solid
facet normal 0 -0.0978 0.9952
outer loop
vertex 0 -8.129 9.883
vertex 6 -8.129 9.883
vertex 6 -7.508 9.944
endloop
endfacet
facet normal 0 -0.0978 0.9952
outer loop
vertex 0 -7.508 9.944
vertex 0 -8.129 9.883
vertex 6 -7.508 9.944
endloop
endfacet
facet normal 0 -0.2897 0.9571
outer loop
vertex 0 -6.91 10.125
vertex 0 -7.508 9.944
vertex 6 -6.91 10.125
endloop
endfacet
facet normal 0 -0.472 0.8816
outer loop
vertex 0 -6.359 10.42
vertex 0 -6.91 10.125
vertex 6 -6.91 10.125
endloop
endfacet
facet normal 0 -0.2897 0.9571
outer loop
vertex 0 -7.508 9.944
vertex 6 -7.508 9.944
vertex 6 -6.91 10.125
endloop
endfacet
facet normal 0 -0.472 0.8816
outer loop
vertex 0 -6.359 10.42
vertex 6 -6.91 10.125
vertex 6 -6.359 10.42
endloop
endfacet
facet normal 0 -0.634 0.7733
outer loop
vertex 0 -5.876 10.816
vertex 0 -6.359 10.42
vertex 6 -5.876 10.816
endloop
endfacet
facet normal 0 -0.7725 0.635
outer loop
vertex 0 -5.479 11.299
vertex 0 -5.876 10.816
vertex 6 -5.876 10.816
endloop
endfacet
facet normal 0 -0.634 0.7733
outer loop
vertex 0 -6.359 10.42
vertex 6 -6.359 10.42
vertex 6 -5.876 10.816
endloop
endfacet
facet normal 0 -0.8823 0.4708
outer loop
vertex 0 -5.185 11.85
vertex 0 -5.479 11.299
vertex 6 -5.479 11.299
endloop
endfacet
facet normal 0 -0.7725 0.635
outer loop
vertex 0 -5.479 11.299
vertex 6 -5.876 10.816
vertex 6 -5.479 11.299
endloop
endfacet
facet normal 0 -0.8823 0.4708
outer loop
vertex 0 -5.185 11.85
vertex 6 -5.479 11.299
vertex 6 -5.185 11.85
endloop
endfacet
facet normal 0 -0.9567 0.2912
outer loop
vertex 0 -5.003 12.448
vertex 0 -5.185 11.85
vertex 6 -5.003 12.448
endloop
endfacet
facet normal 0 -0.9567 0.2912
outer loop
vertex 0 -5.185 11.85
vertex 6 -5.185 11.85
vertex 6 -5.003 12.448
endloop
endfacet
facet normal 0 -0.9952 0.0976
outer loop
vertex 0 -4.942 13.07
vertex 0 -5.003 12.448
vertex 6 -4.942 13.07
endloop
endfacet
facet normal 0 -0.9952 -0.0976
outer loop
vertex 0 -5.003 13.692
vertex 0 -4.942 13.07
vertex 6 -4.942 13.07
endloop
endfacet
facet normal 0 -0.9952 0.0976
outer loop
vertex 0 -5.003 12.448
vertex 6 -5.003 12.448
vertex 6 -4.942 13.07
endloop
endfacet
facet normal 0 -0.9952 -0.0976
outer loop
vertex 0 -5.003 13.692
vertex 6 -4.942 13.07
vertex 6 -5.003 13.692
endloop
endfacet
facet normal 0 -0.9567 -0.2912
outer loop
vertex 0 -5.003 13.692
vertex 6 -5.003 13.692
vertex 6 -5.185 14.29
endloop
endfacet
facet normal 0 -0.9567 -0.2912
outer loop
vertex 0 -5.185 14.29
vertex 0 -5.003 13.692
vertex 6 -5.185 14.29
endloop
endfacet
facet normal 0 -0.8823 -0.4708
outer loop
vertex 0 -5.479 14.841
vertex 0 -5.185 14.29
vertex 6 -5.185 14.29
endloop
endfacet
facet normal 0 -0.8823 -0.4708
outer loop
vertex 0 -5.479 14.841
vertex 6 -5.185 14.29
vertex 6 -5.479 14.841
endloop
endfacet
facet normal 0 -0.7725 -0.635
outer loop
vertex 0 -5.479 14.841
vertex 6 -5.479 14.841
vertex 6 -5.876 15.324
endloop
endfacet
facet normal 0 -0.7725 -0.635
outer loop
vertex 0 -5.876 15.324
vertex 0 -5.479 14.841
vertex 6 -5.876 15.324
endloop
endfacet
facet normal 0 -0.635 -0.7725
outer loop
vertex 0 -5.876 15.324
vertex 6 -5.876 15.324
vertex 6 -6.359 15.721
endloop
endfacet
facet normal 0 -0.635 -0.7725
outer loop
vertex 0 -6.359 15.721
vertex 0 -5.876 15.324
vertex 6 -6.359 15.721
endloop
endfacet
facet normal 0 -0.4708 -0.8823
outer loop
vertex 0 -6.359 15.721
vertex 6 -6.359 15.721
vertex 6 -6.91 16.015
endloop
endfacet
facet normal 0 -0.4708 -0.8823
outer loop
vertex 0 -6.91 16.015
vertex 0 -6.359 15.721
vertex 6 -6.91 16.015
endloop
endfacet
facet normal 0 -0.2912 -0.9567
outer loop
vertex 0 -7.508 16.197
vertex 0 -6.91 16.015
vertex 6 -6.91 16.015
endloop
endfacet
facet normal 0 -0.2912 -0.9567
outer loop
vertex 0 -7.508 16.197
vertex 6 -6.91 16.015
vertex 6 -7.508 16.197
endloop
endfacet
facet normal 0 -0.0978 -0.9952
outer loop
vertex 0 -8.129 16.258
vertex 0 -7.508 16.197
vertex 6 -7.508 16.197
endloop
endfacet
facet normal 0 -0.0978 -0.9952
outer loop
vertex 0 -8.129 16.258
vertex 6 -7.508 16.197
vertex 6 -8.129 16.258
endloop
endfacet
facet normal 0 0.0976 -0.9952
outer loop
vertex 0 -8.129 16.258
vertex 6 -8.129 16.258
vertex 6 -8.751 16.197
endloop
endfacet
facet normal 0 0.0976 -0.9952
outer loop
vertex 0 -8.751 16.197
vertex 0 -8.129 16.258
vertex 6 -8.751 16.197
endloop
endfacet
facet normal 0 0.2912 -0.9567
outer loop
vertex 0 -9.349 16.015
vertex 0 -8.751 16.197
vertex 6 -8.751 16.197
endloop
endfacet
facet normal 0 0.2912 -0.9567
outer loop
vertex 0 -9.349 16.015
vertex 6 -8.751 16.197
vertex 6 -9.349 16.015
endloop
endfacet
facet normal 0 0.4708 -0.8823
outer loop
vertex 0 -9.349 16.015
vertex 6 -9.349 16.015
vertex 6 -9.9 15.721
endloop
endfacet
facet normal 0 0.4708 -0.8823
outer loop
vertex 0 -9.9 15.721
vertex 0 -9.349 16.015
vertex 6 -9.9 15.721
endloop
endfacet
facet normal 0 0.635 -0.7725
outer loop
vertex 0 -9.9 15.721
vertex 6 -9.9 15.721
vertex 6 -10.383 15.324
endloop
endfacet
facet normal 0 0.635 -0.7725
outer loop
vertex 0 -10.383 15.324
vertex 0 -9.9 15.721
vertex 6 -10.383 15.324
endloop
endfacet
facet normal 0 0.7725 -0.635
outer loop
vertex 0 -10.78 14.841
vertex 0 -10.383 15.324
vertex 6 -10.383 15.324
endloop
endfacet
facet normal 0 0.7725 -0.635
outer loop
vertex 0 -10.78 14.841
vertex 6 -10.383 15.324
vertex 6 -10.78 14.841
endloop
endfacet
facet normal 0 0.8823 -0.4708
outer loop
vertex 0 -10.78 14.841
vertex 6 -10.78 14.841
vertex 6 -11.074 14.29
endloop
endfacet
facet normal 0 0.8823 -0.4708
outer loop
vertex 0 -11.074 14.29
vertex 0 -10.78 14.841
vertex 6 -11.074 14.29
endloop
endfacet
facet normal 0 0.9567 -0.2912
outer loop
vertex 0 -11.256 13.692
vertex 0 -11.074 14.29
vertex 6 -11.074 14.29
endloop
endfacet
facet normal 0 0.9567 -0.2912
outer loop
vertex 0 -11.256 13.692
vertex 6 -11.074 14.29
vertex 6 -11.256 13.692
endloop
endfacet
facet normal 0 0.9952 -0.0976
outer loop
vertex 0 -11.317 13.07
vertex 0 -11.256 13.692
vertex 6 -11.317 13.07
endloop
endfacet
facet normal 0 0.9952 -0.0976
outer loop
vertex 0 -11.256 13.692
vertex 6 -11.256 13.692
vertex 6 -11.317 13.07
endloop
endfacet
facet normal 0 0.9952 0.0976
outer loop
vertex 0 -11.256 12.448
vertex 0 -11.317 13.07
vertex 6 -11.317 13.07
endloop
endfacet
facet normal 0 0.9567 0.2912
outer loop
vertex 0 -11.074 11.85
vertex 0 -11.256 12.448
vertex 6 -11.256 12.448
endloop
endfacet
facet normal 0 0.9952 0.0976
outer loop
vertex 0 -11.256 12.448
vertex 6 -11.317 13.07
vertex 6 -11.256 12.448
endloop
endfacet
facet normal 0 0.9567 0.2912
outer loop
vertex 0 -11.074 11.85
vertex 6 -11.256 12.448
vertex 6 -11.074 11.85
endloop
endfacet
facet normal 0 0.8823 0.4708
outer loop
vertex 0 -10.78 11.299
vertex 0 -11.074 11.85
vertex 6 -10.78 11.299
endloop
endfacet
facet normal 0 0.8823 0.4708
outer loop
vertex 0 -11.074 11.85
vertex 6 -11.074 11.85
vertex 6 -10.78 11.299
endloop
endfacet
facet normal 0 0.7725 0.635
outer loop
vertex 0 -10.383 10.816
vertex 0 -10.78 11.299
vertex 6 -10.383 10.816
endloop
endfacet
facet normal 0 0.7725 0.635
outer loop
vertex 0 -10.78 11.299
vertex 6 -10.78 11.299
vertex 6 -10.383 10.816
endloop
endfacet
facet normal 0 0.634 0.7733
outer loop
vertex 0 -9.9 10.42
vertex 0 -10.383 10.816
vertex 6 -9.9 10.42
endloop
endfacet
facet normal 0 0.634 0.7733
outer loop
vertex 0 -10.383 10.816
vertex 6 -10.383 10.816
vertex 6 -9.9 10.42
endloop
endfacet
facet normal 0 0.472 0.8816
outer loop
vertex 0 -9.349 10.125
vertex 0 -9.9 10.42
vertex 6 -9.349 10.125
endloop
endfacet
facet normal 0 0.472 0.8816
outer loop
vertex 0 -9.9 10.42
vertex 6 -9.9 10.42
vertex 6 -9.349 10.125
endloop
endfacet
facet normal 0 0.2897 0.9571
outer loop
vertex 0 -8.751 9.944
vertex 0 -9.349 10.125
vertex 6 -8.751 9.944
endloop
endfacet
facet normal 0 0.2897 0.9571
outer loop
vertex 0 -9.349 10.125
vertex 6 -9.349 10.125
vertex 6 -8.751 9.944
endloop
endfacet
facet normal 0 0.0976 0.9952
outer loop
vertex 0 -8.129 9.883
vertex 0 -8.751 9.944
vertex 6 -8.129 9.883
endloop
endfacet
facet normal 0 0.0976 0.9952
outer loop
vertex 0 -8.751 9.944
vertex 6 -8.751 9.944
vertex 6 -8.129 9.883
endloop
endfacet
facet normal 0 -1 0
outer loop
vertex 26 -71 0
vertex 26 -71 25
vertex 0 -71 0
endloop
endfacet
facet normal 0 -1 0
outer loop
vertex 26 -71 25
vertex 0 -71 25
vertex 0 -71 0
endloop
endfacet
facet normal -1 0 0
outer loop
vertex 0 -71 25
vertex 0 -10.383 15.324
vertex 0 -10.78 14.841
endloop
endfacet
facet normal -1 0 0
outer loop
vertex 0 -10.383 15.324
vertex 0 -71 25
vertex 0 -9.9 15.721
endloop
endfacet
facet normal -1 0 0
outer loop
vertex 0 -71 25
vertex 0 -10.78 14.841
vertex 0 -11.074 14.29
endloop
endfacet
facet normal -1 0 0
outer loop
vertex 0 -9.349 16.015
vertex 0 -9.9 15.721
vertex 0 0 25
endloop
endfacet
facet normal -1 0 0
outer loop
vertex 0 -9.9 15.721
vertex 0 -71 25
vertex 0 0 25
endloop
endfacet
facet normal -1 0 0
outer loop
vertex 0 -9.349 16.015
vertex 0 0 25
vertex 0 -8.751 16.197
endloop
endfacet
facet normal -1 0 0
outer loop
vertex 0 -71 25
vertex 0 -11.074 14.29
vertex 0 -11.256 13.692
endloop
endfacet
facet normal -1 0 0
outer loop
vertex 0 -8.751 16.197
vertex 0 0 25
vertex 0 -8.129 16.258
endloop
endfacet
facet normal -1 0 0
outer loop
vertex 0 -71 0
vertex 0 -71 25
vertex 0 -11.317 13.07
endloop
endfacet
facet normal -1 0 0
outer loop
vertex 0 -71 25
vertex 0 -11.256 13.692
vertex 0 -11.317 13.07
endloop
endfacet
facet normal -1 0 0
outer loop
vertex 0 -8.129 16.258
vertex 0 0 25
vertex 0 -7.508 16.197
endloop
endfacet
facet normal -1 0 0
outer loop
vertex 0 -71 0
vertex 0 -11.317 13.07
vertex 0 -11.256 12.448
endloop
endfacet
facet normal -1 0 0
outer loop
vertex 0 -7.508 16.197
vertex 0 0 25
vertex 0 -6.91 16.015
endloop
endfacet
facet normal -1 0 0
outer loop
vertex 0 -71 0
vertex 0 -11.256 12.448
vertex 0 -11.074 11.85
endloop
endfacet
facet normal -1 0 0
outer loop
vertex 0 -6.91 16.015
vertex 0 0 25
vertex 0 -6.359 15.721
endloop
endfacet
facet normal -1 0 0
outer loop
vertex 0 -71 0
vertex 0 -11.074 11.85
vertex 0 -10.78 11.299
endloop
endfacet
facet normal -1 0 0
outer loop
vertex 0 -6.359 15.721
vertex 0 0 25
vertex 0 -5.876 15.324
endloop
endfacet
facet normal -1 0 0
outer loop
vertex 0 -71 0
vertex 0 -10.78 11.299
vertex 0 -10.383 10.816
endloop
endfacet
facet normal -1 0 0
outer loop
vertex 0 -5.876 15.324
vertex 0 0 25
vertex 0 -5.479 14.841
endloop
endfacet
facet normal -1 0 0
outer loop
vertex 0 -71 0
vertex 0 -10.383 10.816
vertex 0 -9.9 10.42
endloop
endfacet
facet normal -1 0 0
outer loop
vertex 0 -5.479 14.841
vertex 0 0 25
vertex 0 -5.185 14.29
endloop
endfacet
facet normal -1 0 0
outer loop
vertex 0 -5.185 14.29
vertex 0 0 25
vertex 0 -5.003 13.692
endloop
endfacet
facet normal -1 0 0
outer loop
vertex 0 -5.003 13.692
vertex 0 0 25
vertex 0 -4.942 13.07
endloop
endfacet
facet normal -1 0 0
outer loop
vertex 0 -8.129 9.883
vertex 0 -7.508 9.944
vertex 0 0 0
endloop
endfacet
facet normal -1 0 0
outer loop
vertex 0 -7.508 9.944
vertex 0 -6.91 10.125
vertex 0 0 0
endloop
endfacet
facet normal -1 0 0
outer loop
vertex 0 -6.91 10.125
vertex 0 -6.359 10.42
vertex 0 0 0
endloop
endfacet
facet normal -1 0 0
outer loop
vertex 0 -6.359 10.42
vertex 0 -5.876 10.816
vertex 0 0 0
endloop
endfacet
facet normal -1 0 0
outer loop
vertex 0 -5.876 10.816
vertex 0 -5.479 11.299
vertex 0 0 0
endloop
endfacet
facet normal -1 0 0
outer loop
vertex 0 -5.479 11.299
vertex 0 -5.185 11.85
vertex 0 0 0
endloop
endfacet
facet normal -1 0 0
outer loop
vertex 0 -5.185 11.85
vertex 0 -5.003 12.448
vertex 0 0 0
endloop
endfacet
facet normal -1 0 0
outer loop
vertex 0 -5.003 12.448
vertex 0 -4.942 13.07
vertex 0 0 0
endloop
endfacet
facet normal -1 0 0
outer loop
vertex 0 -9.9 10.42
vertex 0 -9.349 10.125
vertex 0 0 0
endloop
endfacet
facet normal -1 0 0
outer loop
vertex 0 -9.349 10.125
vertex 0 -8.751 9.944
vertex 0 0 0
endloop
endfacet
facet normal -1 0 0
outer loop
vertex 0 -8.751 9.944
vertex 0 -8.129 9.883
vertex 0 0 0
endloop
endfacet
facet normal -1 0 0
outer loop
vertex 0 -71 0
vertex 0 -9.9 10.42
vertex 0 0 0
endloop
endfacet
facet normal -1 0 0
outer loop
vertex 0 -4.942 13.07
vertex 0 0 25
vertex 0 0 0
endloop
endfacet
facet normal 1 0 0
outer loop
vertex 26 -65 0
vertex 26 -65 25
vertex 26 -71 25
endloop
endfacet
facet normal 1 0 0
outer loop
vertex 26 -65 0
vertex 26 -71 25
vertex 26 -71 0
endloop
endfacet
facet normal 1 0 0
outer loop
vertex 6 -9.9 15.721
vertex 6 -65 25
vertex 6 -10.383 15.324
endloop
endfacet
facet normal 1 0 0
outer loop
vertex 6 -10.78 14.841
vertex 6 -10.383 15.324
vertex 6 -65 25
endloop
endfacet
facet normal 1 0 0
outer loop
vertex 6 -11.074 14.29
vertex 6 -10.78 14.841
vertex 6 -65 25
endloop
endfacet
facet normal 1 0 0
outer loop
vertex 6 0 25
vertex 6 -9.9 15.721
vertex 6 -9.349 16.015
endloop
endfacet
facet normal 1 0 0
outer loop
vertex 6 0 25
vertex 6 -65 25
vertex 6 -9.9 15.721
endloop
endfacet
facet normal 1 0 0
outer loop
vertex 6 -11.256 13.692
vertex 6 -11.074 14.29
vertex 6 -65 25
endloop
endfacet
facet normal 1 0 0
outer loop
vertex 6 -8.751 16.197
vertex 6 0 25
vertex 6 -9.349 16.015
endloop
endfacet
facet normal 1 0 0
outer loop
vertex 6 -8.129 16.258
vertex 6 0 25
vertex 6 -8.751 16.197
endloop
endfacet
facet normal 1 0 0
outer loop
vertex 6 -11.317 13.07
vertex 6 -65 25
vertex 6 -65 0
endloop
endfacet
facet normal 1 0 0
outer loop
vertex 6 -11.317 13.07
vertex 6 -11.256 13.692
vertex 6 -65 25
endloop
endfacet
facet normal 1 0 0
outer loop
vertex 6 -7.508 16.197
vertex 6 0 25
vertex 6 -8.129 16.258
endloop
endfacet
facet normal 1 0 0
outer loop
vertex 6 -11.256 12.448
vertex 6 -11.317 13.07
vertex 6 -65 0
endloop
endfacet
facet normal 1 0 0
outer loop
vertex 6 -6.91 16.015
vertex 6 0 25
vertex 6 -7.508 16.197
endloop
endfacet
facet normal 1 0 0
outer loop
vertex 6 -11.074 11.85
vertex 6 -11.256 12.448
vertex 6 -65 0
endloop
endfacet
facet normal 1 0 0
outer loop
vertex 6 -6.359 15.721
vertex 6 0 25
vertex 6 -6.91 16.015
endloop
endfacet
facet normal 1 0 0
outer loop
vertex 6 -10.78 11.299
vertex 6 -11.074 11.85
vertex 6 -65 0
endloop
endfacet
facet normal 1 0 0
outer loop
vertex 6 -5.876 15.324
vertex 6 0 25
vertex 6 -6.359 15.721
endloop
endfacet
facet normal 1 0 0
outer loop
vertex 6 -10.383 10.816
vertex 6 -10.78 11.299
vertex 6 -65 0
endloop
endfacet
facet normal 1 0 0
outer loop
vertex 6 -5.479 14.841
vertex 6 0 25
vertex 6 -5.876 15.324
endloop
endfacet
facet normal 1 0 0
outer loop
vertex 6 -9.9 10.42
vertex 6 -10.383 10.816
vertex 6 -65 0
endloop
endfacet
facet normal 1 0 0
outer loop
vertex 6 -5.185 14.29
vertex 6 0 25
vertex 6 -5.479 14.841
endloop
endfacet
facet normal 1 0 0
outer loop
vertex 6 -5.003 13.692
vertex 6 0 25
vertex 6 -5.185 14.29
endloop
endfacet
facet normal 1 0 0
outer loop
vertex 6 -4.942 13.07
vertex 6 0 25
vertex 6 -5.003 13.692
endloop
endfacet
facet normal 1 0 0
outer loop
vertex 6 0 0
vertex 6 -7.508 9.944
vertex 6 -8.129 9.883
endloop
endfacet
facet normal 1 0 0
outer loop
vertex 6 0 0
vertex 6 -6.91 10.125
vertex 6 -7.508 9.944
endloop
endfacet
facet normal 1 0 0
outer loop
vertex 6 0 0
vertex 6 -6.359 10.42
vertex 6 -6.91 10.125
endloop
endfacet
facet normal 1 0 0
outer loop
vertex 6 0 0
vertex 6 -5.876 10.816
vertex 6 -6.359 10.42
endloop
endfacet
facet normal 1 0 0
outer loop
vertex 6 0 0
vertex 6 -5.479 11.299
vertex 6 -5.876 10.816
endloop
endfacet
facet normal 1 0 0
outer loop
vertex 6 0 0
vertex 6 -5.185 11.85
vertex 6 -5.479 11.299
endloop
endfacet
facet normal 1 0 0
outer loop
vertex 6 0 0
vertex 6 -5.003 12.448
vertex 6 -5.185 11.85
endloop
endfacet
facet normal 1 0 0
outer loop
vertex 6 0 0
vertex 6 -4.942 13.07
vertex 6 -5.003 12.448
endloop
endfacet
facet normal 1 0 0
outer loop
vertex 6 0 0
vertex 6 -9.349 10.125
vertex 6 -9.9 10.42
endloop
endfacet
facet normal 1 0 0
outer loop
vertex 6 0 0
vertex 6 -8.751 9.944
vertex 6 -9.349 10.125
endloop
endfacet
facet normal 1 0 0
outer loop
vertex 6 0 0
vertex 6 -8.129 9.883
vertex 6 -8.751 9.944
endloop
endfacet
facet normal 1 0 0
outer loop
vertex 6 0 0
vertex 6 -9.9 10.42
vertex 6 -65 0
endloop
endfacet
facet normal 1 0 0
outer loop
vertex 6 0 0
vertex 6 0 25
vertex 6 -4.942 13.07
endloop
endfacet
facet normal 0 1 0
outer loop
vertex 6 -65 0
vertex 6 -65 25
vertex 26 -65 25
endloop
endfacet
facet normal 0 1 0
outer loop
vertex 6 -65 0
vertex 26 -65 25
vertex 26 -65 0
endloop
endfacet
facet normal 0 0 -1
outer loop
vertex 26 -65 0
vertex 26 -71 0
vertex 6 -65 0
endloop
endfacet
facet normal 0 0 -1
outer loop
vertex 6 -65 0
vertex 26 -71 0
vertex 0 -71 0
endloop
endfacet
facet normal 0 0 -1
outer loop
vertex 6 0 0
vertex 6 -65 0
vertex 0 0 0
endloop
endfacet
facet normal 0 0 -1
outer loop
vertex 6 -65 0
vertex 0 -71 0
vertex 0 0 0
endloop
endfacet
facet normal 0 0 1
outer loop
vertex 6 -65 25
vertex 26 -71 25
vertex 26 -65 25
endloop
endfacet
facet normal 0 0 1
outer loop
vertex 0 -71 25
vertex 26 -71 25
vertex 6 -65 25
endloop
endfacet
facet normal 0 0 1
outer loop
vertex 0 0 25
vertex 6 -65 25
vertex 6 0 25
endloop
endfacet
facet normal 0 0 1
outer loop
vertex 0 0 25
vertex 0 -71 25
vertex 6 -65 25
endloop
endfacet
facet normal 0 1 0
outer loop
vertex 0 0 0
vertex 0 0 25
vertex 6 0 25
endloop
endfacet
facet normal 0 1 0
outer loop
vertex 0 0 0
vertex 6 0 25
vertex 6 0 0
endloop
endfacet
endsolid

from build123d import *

# Parameters (mm, degrees)
SKETCH1_W           = 25
SKETCH1_H           = 71
BOSS_EXTRUDE1_DEPTH = 6
SKETCH2_W           = 25
SKETCH2_H           = 6
BOSS_EXTRUDE2_DEPTH = 20
SKETCH3_R           = 3.187620356
CUT_EXTRUDE1_DEPTH  = 22.5


with BuildPart() as part:
    # Sketch1 → Boss-Extrude1 (new body)
    with BuildSketch(Plane(origin=(0, 0, 0), x_dir=(0, 0, -1), z_dir=(1, 0, 0))):
        with Locations((-12.5, -35.5)):
            Rectangle(SKETCH1_W, SKETCH1_H)
    extrude(amount=BOSS_EXTRUDE1_DEPTH)

    # Sketch2 → Boss-Extrude2 (add)
    with BuildSketch(Plane(origin=(6, 0, 0), x_dir=(0, 0, -1), z_dir=(1, 0, 0))):
        with Locations((-12.5, -68)):
            Rectangle(SKETCH2_W, SKETCH2_H)
    extrude(amount=BOSS_EXTRUDE2_DEPTH)

    # Sketch3 → Cut-Extrude1 (cut)
    with BuildSketch(Plane(origin=(6, 0, 0), x_dir=(0, 0, -1), z_dir=(1, 0, 0))):
        with Locations((-13.070218864, -8.129494521)):
            Circle(SKETCH3_R)
    extrude(amount=-CUT_EXTRUDE1_DEPTH, mode=Mode.SUBTRACT)


solid = part.part
